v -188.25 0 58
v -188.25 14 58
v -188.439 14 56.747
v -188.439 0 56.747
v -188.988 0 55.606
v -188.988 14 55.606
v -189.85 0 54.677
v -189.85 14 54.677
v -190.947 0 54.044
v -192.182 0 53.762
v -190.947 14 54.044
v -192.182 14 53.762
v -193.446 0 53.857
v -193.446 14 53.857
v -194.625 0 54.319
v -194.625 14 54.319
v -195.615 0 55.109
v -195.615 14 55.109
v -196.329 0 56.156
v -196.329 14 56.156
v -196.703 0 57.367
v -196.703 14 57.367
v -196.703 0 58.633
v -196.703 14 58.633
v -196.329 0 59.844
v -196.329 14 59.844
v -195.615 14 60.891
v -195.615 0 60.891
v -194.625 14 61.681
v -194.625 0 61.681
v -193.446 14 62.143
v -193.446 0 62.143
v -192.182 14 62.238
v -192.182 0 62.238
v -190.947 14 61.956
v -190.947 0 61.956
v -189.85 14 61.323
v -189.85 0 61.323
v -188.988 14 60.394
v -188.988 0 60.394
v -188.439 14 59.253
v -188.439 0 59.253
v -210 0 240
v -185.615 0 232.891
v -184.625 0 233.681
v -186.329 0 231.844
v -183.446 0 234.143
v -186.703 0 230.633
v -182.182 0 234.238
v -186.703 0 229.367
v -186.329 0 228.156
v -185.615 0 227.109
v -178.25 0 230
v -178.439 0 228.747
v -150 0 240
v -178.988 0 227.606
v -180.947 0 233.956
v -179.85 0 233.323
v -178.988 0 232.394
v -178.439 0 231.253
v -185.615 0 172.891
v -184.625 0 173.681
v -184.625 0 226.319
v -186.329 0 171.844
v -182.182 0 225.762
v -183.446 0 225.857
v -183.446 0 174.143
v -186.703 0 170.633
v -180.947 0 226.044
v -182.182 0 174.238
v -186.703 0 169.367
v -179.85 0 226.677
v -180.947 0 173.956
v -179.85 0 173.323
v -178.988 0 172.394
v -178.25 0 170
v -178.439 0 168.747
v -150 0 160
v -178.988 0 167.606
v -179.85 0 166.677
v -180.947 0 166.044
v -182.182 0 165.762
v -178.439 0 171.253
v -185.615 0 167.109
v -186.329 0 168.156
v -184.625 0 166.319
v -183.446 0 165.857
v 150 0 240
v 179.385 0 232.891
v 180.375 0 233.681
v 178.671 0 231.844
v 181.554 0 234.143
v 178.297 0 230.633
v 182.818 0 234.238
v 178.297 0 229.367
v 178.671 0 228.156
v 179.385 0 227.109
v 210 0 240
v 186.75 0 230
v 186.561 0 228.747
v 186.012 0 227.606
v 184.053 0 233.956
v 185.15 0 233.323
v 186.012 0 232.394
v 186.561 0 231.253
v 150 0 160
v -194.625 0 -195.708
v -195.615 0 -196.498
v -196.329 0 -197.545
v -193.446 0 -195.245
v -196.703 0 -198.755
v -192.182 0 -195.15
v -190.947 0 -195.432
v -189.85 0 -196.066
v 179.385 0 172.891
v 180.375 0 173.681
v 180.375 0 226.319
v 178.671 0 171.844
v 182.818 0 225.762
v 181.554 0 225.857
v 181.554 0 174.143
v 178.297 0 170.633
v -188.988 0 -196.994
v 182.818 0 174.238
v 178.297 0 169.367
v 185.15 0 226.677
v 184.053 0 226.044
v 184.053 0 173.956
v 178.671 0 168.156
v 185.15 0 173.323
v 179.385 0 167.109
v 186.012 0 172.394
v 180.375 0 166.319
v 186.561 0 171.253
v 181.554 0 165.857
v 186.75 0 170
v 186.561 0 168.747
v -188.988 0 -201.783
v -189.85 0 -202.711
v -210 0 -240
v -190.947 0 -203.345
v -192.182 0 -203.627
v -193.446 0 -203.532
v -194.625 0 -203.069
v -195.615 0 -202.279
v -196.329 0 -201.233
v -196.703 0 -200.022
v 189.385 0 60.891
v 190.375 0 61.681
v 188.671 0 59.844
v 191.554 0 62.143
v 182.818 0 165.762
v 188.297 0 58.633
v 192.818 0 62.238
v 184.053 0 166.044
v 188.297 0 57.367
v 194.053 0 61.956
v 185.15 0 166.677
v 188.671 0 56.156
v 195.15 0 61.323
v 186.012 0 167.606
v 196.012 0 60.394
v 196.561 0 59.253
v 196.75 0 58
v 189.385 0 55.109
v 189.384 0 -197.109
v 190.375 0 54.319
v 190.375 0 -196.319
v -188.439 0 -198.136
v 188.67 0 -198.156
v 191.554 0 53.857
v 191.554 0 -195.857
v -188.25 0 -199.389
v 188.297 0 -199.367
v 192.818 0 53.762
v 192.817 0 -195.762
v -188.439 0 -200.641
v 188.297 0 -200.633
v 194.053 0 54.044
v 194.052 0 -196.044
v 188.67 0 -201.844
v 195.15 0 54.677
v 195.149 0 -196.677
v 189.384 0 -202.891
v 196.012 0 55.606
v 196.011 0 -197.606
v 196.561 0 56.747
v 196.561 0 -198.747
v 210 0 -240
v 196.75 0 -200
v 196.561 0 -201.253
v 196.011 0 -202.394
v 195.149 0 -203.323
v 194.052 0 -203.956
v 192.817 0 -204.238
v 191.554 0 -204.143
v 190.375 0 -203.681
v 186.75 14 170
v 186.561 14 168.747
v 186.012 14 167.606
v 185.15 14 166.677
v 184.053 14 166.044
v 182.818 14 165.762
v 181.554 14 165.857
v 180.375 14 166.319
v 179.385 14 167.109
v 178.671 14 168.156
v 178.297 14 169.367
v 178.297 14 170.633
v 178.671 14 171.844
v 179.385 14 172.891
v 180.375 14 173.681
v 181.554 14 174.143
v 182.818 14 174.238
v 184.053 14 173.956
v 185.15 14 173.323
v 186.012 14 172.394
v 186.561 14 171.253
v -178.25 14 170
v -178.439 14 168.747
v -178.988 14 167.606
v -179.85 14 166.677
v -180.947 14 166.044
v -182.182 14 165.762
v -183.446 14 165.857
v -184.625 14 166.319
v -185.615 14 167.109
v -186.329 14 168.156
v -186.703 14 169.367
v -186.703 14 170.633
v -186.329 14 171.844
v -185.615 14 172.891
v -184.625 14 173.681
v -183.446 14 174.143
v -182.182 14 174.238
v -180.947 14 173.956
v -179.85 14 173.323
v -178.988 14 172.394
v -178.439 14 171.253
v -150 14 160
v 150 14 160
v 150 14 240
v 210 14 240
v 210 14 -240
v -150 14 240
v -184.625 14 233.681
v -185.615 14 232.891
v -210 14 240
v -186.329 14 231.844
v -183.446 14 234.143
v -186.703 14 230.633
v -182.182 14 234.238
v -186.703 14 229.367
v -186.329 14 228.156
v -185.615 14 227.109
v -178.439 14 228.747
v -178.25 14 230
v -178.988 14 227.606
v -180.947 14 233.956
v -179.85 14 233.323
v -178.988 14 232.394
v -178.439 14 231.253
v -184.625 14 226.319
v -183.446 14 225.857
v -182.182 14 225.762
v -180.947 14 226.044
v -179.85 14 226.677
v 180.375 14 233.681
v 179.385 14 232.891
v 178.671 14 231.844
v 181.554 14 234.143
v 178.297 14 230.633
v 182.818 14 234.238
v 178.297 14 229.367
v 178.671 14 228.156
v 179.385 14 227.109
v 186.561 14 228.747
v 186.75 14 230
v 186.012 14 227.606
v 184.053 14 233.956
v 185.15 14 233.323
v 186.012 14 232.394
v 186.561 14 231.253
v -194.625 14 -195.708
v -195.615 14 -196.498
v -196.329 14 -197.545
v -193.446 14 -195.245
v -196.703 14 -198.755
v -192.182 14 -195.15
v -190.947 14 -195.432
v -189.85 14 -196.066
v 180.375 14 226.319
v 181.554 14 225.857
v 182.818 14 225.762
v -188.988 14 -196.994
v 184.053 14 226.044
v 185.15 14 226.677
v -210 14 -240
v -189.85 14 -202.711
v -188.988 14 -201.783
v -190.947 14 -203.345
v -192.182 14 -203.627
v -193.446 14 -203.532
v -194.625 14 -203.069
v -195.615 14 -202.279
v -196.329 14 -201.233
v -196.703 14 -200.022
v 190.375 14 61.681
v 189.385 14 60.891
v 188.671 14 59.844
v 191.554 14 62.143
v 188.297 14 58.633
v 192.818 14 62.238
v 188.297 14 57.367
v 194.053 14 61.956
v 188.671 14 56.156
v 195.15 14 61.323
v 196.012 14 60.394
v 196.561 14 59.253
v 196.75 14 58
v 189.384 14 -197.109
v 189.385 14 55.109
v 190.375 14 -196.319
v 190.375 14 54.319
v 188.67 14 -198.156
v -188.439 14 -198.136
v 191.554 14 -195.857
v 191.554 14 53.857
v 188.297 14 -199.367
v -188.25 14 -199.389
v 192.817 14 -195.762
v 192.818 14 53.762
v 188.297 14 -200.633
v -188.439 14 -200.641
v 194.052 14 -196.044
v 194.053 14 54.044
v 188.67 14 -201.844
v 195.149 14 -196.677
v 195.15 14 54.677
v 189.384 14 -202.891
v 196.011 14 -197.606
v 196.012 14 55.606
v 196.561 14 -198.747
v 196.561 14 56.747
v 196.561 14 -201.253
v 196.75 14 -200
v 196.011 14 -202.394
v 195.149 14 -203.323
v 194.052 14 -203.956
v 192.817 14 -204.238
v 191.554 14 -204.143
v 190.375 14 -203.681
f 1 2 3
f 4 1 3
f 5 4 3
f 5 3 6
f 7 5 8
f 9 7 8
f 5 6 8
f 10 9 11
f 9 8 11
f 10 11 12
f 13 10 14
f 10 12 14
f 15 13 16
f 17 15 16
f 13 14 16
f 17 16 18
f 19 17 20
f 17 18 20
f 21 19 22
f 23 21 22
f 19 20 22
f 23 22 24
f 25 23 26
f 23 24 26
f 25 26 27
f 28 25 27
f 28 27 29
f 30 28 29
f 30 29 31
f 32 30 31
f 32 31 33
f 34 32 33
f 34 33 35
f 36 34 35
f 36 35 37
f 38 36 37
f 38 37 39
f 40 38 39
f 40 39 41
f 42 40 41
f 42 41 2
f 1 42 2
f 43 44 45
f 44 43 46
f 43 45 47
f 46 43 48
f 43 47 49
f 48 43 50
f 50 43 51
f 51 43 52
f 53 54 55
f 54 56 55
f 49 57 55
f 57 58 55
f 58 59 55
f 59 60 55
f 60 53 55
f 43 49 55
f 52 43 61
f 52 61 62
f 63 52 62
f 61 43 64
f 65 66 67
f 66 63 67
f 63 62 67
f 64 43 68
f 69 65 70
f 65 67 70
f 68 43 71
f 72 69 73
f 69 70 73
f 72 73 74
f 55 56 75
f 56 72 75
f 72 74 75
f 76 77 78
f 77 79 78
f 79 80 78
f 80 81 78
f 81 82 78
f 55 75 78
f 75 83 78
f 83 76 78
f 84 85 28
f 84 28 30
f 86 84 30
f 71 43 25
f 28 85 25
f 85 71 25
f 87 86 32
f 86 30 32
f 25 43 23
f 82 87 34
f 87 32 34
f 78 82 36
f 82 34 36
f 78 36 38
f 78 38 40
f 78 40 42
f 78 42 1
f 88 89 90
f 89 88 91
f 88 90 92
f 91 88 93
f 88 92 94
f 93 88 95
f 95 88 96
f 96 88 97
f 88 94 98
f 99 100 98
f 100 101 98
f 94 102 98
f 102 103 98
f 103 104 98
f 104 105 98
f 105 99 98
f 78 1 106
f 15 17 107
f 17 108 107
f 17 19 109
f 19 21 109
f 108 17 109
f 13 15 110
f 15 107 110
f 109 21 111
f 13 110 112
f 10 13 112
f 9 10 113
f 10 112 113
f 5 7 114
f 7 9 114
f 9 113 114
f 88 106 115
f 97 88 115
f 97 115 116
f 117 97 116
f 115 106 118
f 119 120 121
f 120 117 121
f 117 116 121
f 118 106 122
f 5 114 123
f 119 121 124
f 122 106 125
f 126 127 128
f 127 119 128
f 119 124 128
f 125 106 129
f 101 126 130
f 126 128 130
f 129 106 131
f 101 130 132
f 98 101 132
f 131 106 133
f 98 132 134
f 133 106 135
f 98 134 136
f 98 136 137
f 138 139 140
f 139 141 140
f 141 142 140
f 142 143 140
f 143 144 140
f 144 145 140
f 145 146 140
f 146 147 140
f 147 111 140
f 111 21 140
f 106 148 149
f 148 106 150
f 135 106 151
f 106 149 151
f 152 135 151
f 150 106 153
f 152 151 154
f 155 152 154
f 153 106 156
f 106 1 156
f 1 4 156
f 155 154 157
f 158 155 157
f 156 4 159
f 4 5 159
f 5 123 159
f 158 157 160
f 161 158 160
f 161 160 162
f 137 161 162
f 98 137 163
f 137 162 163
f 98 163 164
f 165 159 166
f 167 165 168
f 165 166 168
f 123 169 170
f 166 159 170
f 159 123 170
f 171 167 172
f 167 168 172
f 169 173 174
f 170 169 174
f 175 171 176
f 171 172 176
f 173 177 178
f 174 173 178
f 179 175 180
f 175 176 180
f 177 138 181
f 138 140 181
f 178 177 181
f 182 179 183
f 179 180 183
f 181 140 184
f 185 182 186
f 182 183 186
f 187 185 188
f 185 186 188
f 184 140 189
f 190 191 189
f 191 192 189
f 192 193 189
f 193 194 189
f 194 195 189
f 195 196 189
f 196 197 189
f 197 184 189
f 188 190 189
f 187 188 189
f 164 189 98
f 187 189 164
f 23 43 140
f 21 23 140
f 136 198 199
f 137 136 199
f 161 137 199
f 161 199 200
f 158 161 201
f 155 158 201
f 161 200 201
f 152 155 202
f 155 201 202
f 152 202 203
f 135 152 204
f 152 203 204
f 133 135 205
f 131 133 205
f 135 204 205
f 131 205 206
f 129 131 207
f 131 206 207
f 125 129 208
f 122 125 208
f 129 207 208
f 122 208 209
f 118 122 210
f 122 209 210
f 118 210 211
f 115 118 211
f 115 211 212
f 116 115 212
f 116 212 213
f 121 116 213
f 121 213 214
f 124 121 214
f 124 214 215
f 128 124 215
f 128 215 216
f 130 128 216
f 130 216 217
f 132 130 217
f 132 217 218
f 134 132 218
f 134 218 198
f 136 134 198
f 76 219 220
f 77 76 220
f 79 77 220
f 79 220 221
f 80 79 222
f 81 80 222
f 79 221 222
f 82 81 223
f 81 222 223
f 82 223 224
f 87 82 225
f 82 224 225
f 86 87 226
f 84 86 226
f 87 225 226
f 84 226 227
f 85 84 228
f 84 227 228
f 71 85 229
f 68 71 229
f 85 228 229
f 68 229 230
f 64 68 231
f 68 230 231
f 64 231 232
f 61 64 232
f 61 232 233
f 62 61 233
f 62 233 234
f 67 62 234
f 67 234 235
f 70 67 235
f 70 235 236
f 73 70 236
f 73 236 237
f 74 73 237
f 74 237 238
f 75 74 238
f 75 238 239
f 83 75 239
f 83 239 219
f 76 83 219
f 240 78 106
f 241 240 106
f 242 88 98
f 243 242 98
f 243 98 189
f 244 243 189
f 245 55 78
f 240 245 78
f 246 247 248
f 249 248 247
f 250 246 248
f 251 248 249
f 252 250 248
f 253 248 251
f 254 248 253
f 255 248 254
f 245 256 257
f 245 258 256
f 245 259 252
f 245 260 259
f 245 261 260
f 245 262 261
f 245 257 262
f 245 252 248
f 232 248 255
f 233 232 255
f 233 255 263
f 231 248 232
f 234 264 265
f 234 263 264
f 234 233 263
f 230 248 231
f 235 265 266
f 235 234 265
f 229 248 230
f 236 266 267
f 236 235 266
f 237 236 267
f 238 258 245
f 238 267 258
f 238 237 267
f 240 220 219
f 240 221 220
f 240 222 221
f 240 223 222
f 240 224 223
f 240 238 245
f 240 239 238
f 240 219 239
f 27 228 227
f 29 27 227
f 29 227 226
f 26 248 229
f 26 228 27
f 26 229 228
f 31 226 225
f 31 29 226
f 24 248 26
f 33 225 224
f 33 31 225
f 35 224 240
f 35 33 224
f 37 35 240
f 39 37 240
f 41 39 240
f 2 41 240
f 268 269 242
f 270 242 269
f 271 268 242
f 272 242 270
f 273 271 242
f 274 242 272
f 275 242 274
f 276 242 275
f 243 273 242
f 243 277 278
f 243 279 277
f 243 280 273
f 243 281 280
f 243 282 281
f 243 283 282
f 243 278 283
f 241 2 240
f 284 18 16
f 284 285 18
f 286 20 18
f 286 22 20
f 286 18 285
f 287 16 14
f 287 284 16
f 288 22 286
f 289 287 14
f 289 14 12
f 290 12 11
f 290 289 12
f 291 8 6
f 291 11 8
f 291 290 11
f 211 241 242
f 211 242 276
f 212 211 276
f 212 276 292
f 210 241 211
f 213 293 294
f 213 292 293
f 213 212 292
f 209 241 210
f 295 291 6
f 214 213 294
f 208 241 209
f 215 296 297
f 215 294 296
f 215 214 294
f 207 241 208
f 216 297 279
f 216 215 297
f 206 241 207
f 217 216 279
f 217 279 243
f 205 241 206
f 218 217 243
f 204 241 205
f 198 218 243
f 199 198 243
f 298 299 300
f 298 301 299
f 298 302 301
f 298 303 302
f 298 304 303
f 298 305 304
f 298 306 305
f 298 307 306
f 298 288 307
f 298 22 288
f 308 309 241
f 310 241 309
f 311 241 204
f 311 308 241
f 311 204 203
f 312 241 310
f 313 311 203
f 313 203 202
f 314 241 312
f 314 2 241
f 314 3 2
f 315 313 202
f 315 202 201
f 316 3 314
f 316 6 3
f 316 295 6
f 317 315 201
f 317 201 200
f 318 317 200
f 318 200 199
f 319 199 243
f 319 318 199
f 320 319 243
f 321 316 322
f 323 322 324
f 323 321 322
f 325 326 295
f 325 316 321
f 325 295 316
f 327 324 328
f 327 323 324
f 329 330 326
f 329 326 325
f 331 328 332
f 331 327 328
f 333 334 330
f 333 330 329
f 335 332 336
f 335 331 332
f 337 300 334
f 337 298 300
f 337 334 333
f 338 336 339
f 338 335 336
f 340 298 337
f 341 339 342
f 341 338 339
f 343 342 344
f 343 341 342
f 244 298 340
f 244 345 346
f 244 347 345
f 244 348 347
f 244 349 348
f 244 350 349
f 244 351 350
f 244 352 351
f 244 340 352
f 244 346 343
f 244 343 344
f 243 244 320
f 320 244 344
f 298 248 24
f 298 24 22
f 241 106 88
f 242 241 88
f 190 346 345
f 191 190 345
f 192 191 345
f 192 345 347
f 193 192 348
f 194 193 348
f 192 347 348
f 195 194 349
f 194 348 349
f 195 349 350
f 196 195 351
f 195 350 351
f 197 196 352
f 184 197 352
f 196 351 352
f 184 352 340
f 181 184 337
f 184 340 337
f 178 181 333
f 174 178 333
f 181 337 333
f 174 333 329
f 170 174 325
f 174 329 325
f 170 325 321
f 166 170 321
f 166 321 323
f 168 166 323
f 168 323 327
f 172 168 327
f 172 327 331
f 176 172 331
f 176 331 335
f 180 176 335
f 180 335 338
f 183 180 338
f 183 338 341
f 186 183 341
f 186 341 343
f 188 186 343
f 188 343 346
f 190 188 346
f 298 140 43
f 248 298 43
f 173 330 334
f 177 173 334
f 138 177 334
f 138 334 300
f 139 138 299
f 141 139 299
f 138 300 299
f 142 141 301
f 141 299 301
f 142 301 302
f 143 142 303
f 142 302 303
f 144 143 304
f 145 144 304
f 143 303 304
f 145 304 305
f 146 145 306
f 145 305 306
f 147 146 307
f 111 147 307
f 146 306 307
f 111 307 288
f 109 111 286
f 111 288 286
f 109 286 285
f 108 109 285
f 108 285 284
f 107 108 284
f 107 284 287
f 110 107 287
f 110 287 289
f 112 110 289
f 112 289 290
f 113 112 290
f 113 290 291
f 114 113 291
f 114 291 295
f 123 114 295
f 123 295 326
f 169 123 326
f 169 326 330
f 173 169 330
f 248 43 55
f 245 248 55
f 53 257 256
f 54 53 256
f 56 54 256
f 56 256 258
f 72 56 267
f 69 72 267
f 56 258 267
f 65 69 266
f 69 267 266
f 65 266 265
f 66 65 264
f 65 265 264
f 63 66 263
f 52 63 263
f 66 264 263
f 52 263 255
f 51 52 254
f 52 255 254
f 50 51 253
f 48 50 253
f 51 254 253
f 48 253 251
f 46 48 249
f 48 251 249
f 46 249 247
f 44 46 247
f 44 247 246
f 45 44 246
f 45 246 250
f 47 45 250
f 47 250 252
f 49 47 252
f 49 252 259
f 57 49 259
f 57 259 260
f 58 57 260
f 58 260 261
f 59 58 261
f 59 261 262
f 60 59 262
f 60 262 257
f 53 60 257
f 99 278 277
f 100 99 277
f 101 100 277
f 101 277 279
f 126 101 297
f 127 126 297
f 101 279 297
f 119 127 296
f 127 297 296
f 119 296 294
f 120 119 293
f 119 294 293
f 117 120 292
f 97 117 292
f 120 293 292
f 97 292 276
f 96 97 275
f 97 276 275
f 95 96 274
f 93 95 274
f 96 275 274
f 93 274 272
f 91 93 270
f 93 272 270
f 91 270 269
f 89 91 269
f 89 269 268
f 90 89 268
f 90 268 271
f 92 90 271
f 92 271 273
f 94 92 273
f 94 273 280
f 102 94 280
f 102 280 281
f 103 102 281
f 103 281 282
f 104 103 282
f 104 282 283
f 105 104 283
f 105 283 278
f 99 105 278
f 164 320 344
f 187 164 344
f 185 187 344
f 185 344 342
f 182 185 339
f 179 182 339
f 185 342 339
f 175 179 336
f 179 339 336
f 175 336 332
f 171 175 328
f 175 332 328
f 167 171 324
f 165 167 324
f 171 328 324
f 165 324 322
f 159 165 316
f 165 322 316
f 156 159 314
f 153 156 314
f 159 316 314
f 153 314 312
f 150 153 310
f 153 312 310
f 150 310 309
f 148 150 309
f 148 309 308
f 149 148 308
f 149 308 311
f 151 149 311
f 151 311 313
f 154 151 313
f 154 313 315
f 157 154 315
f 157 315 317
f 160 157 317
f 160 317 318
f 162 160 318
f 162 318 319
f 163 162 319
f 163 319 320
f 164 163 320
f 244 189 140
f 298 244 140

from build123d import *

# Parameters (mm, degrees)
SALIENTE_EXTRUIR1_DEPTH = 14
CROQUIS2_R              = 4.25
CORTAR_EXTRUIR1_DEPTH   = 15


with BuildPart() as part:
    # Croquis1 → Saliente-Extruir1 (new body)
    with BuildSketch(Plane(origin=(0, 0, 0), x_dir=(1, 0, 0), z_dir=(0, 1, 0))):
        Polygon((150, -240), (210, -240), (210, 240), (-210, 240), (-210, -240), (-150, -240), (-150, -160), (150, -160), align=None)
    extrude(amount=SALIENTE_EXTRUIR1_DEPTH)

    # Croquis2 → Cortar-Extruir1 (cut, through all)
    with BuildSketch(Plane(origin=(0, 14, 0), x_dir=(1, 0, 0), z_dir=(0, 1, 0))):
        with Locations((-182.5, -230.00000008)):
            Circle(CROQUIS2_R)
        with Locations((-182.5, -170.00000008)):
            Circle(CROQUIS2_R)
        with Locations((-192.5, -58)):
            Circle(CROQUIS2_R)
        with Locations((-192.5, 199.388515843)):
            Circle(CROQUIS2_R)
        with Locations((192.499514399, 200)):
            Circle(CROQUIS2_R)
        with Locations((192.5, -58)):
            Circle(CROQUIS2_R)
        with Locations((182.5, -170)):
            Circle(CROQUIS2_R)
        with Locations((182.5, -230)):
            Circle(CROQUIS2_R)
    extrude(amount=-CORTAR_EXTRUIR1_DEPTH, mode=Mode.SUBTRACT)


solid = part.part
